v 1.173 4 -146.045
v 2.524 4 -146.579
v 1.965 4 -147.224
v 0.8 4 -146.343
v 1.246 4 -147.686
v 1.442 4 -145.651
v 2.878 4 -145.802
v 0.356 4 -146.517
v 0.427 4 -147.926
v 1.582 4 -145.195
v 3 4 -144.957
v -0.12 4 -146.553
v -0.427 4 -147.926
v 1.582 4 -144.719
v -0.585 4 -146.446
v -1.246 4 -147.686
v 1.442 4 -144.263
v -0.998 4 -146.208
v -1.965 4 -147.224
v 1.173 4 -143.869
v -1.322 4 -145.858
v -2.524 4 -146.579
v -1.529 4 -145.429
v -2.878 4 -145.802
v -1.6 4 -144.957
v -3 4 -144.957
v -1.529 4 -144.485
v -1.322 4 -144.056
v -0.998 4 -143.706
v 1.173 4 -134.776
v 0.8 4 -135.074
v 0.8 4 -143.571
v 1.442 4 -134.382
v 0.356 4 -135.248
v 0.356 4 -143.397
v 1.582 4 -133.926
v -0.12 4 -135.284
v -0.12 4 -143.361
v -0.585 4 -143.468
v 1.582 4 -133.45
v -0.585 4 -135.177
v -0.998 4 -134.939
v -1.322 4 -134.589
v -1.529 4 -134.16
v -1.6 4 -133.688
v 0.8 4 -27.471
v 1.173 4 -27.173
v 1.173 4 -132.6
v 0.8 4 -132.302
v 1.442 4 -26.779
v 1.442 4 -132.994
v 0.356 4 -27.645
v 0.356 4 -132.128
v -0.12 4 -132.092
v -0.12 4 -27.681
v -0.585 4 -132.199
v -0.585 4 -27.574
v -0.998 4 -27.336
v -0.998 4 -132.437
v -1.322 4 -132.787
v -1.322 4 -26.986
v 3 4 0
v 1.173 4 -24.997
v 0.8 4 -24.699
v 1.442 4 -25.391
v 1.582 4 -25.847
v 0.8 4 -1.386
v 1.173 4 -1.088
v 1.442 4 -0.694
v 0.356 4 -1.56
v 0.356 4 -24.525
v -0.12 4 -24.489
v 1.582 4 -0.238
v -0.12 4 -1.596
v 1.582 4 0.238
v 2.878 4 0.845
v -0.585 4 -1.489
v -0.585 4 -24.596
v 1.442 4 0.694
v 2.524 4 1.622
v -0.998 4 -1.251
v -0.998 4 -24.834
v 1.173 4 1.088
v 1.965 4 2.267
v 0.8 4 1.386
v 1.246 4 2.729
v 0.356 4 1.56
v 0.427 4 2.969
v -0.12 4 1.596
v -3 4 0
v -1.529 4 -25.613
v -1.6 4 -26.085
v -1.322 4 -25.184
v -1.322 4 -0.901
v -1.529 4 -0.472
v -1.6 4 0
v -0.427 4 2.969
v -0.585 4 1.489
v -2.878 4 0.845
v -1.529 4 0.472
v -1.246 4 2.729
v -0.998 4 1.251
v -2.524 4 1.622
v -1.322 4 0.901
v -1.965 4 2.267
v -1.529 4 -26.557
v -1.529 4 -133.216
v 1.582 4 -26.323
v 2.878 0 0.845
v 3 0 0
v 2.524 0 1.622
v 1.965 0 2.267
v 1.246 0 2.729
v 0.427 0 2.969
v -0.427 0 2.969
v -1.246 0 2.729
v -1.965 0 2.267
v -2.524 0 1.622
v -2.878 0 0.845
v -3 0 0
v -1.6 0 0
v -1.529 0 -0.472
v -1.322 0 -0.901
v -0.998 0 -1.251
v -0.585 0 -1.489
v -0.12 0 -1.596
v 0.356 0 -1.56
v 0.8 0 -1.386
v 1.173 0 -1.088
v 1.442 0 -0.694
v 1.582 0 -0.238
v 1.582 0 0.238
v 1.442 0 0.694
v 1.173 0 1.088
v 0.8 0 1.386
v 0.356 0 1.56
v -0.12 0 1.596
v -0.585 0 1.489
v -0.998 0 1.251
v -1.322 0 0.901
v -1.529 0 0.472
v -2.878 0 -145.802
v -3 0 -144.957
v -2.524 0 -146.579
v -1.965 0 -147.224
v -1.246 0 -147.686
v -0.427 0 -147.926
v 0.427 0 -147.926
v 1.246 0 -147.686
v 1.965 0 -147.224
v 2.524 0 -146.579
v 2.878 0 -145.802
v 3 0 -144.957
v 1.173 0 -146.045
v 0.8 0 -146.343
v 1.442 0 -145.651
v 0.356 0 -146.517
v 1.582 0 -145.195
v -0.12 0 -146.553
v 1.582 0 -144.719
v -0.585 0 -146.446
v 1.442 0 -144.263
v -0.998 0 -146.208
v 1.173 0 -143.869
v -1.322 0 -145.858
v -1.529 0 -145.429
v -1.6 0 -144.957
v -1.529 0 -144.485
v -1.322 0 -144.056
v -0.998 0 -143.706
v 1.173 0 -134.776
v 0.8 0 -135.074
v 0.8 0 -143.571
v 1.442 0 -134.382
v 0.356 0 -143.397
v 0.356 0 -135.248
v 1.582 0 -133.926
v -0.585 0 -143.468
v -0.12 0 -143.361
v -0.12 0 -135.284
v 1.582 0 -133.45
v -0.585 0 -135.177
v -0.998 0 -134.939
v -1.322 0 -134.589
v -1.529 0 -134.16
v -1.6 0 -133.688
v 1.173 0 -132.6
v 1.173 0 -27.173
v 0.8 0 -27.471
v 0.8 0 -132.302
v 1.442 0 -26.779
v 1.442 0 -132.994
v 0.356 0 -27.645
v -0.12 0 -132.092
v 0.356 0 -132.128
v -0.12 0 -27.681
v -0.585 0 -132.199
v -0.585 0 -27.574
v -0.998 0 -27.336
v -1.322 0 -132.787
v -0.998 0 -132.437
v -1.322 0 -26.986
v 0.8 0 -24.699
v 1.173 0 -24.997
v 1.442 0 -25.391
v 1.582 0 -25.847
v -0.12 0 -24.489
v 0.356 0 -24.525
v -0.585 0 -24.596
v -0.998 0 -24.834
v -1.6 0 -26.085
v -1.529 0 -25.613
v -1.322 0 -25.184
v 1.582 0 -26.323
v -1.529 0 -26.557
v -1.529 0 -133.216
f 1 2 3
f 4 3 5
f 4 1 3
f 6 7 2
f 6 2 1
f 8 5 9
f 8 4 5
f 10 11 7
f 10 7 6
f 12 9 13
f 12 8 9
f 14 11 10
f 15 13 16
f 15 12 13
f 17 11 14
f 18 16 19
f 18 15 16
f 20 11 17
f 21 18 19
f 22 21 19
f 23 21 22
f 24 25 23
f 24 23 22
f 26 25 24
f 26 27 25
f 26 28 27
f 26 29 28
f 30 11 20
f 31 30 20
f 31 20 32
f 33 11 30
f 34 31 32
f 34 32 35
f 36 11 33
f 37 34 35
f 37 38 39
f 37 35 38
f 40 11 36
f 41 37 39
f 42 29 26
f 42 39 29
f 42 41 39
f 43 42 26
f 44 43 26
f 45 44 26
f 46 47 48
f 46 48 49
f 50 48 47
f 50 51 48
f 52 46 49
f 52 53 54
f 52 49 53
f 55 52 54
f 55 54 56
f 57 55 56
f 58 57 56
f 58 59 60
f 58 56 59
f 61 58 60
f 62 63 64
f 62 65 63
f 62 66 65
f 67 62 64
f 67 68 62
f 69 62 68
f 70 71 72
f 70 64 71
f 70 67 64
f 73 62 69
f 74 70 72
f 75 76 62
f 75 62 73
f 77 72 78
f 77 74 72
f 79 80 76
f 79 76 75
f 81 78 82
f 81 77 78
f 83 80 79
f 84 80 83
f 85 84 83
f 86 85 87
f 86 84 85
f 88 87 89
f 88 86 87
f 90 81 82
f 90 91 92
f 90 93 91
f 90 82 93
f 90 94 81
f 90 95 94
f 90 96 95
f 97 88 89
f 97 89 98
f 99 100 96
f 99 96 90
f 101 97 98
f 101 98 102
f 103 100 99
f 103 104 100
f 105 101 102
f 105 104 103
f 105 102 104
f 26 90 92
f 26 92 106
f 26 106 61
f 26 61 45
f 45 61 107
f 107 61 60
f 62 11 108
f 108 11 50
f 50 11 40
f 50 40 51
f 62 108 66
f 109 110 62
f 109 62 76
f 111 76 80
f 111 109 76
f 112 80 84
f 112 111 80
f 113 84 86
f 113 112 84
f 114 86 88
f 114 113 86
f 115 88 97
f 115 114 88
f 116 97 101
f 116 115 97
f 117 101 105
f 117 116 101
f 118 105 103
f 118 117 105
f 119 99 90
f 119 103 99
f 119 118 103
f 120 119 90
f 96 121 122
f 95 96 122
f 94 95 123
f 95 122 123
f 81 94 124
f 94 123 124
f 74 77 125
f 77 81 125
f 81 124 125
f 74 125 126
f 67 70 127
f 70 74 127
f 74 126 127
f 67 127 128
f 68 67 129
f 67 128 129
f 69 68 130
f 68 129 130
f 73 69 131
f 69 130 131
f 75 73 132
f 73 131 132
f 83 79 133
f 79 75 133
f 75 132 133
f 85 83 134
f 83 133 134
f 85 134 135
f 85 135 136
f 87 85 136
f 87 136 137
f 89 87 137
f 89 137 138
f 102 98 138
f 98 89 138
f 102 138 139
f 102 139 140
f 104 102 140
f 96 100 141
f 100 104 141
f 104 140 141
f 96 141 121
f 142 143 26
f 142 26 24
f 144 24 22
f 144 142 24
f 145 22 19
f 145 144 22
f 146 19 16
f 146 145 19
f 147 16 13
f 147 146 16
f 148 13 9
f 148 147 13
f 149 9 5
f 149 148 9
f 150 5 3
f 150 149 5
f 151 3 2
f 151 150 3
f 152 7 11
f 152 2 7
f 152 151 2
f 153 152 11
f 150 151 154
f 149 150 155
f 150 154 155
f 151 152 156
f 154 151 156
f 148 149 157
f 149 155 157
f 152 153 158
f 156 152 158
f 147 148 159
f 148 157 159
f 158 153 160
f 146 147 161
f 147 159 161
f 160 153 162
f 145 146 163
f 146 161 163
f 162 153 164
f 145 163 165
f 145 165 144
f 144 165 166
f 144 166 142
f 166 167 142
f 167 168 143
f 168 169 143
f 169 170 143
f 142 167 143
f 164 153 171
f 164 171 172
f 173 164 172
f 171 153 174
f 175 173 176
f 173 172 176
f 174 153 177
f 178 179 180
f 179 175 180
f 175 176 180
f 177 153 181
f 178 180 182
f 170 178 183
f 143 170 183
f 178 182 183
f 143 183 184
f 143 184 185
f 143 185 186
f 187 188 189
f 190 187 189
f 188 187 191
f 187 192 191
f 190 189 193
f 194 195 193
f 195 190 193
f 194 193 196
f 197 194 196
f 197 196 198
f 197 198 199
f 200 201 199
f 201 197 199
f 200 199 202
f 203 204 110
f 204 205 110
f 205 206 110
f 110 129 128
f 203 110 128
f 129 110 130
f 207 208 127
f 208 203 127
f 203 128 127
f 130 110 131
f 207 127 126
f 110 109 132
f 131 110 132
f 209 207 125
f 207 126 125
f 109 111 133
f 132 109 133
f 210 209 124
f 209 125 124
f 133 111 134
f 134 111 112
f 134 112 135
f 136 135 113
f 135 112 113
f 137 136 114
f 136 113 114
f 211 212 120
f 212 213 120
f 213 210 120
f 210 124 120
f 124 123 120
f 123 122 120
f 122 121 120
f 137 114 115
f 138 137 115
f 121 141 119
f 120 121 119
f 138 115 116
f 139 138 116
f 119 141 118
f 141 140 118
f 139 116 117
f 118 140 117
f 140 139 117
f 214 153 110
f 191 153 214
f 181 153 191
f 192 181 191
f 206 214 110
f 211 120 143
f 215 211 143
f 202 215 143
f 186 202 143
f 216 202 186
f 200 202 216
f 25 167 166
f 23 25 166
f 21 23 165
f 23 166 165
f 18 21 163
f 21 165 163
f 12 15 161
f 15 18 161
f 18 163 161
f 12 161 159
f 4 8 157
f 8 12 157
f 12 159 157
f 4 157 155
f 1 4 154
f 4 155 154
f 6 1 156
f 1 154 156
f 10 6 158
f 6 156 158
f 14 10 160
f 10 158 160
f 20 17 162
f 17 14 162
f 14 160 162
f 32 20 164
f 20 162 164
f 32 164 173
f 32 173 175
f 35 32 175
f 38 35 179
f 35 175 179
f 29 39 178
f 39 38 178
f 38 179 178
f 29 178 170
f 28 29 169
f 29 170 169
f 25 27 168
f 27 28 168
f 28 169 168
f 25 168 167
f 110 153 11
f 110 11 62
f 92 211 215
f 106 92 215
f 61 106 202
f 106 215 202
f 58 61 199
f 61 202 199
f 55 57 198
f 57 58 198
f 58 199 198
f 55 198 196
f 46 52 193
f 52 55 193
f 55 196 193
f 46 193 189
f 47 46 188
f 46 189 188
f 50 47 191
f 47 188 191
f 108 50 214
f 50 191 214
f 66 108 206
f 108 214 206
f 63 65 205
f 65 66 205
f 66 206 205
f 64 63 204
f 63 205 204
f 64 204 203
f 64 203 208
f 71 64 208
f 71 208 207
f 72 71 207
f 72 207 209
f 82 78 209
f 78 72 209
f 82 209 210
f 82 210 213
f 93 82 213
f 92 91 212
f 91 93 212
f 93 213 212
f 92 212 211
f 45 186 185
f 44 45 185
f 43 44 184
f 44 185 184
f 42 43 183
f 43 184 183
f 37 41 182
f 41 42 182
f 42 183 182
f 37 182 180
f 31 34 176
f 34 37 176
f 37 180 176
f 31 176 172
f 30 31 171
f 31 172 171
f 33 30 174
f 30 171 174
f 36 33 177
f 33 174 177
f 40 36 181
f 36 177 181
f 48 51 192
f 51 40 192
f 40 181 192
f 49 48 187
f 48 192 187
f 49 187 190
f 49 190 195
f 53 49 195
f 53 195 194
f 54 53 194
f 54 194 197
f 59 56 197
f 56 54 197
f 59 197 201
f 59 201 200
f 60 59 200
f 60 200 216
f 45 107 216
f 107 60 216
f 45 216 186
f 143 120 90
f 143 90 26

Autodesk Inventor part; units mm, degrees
ref_plane "YZ Plane" through (0, 0, 0) normal (1, 0, 0) x (0, 1, 0)
ref_plane "XZ Plane" through (0, 0, 0) normal (0, 1, 0) x (-1, 0, 0)
ref_plane "XY Plane" through (0, 0, 0) normal (0, 0, 1) x (1, 0, 0)
sketch "Sketch1" plane through (0, 0, 0) normal (0, 1, 0) x (-1, 0, 0)
  line L0 (0, 0) -> (0, -144.957) construction
  line L1 (3, 0) -> (3, -144.957)
  line L2 (-3, -144.957) -> (-3, 0)
  arc A0 (3, 0) -> (-3, 0) centre (0, 0) ccw
  arc A1 (-3, -144.957) -> (3, -144.957) centre (0, -144.957) ccw
  circle A2 centre (0, 0) radius 1.6
  circle A3 centre (0, -144.957) radius 1.6
  circle A4 centre (0, -26.085) radius 1.6
  circle A5 centre (0, -133.688) radius 1.6
  point P0 (0, -72.4785)
  dimension "d0" = 3.2
  dimension "d1" = 3.2
  dimension "d2" = 6
  dimension "d3" = 144.957
  dimension "d10" = 3.2
  dimension "d11" = 26.085
  dimension "d12" = 3.2
  dimension "d13" = 133.688
extrude "Extrusion1" add sketch "Sketch1" along normal blind 4
